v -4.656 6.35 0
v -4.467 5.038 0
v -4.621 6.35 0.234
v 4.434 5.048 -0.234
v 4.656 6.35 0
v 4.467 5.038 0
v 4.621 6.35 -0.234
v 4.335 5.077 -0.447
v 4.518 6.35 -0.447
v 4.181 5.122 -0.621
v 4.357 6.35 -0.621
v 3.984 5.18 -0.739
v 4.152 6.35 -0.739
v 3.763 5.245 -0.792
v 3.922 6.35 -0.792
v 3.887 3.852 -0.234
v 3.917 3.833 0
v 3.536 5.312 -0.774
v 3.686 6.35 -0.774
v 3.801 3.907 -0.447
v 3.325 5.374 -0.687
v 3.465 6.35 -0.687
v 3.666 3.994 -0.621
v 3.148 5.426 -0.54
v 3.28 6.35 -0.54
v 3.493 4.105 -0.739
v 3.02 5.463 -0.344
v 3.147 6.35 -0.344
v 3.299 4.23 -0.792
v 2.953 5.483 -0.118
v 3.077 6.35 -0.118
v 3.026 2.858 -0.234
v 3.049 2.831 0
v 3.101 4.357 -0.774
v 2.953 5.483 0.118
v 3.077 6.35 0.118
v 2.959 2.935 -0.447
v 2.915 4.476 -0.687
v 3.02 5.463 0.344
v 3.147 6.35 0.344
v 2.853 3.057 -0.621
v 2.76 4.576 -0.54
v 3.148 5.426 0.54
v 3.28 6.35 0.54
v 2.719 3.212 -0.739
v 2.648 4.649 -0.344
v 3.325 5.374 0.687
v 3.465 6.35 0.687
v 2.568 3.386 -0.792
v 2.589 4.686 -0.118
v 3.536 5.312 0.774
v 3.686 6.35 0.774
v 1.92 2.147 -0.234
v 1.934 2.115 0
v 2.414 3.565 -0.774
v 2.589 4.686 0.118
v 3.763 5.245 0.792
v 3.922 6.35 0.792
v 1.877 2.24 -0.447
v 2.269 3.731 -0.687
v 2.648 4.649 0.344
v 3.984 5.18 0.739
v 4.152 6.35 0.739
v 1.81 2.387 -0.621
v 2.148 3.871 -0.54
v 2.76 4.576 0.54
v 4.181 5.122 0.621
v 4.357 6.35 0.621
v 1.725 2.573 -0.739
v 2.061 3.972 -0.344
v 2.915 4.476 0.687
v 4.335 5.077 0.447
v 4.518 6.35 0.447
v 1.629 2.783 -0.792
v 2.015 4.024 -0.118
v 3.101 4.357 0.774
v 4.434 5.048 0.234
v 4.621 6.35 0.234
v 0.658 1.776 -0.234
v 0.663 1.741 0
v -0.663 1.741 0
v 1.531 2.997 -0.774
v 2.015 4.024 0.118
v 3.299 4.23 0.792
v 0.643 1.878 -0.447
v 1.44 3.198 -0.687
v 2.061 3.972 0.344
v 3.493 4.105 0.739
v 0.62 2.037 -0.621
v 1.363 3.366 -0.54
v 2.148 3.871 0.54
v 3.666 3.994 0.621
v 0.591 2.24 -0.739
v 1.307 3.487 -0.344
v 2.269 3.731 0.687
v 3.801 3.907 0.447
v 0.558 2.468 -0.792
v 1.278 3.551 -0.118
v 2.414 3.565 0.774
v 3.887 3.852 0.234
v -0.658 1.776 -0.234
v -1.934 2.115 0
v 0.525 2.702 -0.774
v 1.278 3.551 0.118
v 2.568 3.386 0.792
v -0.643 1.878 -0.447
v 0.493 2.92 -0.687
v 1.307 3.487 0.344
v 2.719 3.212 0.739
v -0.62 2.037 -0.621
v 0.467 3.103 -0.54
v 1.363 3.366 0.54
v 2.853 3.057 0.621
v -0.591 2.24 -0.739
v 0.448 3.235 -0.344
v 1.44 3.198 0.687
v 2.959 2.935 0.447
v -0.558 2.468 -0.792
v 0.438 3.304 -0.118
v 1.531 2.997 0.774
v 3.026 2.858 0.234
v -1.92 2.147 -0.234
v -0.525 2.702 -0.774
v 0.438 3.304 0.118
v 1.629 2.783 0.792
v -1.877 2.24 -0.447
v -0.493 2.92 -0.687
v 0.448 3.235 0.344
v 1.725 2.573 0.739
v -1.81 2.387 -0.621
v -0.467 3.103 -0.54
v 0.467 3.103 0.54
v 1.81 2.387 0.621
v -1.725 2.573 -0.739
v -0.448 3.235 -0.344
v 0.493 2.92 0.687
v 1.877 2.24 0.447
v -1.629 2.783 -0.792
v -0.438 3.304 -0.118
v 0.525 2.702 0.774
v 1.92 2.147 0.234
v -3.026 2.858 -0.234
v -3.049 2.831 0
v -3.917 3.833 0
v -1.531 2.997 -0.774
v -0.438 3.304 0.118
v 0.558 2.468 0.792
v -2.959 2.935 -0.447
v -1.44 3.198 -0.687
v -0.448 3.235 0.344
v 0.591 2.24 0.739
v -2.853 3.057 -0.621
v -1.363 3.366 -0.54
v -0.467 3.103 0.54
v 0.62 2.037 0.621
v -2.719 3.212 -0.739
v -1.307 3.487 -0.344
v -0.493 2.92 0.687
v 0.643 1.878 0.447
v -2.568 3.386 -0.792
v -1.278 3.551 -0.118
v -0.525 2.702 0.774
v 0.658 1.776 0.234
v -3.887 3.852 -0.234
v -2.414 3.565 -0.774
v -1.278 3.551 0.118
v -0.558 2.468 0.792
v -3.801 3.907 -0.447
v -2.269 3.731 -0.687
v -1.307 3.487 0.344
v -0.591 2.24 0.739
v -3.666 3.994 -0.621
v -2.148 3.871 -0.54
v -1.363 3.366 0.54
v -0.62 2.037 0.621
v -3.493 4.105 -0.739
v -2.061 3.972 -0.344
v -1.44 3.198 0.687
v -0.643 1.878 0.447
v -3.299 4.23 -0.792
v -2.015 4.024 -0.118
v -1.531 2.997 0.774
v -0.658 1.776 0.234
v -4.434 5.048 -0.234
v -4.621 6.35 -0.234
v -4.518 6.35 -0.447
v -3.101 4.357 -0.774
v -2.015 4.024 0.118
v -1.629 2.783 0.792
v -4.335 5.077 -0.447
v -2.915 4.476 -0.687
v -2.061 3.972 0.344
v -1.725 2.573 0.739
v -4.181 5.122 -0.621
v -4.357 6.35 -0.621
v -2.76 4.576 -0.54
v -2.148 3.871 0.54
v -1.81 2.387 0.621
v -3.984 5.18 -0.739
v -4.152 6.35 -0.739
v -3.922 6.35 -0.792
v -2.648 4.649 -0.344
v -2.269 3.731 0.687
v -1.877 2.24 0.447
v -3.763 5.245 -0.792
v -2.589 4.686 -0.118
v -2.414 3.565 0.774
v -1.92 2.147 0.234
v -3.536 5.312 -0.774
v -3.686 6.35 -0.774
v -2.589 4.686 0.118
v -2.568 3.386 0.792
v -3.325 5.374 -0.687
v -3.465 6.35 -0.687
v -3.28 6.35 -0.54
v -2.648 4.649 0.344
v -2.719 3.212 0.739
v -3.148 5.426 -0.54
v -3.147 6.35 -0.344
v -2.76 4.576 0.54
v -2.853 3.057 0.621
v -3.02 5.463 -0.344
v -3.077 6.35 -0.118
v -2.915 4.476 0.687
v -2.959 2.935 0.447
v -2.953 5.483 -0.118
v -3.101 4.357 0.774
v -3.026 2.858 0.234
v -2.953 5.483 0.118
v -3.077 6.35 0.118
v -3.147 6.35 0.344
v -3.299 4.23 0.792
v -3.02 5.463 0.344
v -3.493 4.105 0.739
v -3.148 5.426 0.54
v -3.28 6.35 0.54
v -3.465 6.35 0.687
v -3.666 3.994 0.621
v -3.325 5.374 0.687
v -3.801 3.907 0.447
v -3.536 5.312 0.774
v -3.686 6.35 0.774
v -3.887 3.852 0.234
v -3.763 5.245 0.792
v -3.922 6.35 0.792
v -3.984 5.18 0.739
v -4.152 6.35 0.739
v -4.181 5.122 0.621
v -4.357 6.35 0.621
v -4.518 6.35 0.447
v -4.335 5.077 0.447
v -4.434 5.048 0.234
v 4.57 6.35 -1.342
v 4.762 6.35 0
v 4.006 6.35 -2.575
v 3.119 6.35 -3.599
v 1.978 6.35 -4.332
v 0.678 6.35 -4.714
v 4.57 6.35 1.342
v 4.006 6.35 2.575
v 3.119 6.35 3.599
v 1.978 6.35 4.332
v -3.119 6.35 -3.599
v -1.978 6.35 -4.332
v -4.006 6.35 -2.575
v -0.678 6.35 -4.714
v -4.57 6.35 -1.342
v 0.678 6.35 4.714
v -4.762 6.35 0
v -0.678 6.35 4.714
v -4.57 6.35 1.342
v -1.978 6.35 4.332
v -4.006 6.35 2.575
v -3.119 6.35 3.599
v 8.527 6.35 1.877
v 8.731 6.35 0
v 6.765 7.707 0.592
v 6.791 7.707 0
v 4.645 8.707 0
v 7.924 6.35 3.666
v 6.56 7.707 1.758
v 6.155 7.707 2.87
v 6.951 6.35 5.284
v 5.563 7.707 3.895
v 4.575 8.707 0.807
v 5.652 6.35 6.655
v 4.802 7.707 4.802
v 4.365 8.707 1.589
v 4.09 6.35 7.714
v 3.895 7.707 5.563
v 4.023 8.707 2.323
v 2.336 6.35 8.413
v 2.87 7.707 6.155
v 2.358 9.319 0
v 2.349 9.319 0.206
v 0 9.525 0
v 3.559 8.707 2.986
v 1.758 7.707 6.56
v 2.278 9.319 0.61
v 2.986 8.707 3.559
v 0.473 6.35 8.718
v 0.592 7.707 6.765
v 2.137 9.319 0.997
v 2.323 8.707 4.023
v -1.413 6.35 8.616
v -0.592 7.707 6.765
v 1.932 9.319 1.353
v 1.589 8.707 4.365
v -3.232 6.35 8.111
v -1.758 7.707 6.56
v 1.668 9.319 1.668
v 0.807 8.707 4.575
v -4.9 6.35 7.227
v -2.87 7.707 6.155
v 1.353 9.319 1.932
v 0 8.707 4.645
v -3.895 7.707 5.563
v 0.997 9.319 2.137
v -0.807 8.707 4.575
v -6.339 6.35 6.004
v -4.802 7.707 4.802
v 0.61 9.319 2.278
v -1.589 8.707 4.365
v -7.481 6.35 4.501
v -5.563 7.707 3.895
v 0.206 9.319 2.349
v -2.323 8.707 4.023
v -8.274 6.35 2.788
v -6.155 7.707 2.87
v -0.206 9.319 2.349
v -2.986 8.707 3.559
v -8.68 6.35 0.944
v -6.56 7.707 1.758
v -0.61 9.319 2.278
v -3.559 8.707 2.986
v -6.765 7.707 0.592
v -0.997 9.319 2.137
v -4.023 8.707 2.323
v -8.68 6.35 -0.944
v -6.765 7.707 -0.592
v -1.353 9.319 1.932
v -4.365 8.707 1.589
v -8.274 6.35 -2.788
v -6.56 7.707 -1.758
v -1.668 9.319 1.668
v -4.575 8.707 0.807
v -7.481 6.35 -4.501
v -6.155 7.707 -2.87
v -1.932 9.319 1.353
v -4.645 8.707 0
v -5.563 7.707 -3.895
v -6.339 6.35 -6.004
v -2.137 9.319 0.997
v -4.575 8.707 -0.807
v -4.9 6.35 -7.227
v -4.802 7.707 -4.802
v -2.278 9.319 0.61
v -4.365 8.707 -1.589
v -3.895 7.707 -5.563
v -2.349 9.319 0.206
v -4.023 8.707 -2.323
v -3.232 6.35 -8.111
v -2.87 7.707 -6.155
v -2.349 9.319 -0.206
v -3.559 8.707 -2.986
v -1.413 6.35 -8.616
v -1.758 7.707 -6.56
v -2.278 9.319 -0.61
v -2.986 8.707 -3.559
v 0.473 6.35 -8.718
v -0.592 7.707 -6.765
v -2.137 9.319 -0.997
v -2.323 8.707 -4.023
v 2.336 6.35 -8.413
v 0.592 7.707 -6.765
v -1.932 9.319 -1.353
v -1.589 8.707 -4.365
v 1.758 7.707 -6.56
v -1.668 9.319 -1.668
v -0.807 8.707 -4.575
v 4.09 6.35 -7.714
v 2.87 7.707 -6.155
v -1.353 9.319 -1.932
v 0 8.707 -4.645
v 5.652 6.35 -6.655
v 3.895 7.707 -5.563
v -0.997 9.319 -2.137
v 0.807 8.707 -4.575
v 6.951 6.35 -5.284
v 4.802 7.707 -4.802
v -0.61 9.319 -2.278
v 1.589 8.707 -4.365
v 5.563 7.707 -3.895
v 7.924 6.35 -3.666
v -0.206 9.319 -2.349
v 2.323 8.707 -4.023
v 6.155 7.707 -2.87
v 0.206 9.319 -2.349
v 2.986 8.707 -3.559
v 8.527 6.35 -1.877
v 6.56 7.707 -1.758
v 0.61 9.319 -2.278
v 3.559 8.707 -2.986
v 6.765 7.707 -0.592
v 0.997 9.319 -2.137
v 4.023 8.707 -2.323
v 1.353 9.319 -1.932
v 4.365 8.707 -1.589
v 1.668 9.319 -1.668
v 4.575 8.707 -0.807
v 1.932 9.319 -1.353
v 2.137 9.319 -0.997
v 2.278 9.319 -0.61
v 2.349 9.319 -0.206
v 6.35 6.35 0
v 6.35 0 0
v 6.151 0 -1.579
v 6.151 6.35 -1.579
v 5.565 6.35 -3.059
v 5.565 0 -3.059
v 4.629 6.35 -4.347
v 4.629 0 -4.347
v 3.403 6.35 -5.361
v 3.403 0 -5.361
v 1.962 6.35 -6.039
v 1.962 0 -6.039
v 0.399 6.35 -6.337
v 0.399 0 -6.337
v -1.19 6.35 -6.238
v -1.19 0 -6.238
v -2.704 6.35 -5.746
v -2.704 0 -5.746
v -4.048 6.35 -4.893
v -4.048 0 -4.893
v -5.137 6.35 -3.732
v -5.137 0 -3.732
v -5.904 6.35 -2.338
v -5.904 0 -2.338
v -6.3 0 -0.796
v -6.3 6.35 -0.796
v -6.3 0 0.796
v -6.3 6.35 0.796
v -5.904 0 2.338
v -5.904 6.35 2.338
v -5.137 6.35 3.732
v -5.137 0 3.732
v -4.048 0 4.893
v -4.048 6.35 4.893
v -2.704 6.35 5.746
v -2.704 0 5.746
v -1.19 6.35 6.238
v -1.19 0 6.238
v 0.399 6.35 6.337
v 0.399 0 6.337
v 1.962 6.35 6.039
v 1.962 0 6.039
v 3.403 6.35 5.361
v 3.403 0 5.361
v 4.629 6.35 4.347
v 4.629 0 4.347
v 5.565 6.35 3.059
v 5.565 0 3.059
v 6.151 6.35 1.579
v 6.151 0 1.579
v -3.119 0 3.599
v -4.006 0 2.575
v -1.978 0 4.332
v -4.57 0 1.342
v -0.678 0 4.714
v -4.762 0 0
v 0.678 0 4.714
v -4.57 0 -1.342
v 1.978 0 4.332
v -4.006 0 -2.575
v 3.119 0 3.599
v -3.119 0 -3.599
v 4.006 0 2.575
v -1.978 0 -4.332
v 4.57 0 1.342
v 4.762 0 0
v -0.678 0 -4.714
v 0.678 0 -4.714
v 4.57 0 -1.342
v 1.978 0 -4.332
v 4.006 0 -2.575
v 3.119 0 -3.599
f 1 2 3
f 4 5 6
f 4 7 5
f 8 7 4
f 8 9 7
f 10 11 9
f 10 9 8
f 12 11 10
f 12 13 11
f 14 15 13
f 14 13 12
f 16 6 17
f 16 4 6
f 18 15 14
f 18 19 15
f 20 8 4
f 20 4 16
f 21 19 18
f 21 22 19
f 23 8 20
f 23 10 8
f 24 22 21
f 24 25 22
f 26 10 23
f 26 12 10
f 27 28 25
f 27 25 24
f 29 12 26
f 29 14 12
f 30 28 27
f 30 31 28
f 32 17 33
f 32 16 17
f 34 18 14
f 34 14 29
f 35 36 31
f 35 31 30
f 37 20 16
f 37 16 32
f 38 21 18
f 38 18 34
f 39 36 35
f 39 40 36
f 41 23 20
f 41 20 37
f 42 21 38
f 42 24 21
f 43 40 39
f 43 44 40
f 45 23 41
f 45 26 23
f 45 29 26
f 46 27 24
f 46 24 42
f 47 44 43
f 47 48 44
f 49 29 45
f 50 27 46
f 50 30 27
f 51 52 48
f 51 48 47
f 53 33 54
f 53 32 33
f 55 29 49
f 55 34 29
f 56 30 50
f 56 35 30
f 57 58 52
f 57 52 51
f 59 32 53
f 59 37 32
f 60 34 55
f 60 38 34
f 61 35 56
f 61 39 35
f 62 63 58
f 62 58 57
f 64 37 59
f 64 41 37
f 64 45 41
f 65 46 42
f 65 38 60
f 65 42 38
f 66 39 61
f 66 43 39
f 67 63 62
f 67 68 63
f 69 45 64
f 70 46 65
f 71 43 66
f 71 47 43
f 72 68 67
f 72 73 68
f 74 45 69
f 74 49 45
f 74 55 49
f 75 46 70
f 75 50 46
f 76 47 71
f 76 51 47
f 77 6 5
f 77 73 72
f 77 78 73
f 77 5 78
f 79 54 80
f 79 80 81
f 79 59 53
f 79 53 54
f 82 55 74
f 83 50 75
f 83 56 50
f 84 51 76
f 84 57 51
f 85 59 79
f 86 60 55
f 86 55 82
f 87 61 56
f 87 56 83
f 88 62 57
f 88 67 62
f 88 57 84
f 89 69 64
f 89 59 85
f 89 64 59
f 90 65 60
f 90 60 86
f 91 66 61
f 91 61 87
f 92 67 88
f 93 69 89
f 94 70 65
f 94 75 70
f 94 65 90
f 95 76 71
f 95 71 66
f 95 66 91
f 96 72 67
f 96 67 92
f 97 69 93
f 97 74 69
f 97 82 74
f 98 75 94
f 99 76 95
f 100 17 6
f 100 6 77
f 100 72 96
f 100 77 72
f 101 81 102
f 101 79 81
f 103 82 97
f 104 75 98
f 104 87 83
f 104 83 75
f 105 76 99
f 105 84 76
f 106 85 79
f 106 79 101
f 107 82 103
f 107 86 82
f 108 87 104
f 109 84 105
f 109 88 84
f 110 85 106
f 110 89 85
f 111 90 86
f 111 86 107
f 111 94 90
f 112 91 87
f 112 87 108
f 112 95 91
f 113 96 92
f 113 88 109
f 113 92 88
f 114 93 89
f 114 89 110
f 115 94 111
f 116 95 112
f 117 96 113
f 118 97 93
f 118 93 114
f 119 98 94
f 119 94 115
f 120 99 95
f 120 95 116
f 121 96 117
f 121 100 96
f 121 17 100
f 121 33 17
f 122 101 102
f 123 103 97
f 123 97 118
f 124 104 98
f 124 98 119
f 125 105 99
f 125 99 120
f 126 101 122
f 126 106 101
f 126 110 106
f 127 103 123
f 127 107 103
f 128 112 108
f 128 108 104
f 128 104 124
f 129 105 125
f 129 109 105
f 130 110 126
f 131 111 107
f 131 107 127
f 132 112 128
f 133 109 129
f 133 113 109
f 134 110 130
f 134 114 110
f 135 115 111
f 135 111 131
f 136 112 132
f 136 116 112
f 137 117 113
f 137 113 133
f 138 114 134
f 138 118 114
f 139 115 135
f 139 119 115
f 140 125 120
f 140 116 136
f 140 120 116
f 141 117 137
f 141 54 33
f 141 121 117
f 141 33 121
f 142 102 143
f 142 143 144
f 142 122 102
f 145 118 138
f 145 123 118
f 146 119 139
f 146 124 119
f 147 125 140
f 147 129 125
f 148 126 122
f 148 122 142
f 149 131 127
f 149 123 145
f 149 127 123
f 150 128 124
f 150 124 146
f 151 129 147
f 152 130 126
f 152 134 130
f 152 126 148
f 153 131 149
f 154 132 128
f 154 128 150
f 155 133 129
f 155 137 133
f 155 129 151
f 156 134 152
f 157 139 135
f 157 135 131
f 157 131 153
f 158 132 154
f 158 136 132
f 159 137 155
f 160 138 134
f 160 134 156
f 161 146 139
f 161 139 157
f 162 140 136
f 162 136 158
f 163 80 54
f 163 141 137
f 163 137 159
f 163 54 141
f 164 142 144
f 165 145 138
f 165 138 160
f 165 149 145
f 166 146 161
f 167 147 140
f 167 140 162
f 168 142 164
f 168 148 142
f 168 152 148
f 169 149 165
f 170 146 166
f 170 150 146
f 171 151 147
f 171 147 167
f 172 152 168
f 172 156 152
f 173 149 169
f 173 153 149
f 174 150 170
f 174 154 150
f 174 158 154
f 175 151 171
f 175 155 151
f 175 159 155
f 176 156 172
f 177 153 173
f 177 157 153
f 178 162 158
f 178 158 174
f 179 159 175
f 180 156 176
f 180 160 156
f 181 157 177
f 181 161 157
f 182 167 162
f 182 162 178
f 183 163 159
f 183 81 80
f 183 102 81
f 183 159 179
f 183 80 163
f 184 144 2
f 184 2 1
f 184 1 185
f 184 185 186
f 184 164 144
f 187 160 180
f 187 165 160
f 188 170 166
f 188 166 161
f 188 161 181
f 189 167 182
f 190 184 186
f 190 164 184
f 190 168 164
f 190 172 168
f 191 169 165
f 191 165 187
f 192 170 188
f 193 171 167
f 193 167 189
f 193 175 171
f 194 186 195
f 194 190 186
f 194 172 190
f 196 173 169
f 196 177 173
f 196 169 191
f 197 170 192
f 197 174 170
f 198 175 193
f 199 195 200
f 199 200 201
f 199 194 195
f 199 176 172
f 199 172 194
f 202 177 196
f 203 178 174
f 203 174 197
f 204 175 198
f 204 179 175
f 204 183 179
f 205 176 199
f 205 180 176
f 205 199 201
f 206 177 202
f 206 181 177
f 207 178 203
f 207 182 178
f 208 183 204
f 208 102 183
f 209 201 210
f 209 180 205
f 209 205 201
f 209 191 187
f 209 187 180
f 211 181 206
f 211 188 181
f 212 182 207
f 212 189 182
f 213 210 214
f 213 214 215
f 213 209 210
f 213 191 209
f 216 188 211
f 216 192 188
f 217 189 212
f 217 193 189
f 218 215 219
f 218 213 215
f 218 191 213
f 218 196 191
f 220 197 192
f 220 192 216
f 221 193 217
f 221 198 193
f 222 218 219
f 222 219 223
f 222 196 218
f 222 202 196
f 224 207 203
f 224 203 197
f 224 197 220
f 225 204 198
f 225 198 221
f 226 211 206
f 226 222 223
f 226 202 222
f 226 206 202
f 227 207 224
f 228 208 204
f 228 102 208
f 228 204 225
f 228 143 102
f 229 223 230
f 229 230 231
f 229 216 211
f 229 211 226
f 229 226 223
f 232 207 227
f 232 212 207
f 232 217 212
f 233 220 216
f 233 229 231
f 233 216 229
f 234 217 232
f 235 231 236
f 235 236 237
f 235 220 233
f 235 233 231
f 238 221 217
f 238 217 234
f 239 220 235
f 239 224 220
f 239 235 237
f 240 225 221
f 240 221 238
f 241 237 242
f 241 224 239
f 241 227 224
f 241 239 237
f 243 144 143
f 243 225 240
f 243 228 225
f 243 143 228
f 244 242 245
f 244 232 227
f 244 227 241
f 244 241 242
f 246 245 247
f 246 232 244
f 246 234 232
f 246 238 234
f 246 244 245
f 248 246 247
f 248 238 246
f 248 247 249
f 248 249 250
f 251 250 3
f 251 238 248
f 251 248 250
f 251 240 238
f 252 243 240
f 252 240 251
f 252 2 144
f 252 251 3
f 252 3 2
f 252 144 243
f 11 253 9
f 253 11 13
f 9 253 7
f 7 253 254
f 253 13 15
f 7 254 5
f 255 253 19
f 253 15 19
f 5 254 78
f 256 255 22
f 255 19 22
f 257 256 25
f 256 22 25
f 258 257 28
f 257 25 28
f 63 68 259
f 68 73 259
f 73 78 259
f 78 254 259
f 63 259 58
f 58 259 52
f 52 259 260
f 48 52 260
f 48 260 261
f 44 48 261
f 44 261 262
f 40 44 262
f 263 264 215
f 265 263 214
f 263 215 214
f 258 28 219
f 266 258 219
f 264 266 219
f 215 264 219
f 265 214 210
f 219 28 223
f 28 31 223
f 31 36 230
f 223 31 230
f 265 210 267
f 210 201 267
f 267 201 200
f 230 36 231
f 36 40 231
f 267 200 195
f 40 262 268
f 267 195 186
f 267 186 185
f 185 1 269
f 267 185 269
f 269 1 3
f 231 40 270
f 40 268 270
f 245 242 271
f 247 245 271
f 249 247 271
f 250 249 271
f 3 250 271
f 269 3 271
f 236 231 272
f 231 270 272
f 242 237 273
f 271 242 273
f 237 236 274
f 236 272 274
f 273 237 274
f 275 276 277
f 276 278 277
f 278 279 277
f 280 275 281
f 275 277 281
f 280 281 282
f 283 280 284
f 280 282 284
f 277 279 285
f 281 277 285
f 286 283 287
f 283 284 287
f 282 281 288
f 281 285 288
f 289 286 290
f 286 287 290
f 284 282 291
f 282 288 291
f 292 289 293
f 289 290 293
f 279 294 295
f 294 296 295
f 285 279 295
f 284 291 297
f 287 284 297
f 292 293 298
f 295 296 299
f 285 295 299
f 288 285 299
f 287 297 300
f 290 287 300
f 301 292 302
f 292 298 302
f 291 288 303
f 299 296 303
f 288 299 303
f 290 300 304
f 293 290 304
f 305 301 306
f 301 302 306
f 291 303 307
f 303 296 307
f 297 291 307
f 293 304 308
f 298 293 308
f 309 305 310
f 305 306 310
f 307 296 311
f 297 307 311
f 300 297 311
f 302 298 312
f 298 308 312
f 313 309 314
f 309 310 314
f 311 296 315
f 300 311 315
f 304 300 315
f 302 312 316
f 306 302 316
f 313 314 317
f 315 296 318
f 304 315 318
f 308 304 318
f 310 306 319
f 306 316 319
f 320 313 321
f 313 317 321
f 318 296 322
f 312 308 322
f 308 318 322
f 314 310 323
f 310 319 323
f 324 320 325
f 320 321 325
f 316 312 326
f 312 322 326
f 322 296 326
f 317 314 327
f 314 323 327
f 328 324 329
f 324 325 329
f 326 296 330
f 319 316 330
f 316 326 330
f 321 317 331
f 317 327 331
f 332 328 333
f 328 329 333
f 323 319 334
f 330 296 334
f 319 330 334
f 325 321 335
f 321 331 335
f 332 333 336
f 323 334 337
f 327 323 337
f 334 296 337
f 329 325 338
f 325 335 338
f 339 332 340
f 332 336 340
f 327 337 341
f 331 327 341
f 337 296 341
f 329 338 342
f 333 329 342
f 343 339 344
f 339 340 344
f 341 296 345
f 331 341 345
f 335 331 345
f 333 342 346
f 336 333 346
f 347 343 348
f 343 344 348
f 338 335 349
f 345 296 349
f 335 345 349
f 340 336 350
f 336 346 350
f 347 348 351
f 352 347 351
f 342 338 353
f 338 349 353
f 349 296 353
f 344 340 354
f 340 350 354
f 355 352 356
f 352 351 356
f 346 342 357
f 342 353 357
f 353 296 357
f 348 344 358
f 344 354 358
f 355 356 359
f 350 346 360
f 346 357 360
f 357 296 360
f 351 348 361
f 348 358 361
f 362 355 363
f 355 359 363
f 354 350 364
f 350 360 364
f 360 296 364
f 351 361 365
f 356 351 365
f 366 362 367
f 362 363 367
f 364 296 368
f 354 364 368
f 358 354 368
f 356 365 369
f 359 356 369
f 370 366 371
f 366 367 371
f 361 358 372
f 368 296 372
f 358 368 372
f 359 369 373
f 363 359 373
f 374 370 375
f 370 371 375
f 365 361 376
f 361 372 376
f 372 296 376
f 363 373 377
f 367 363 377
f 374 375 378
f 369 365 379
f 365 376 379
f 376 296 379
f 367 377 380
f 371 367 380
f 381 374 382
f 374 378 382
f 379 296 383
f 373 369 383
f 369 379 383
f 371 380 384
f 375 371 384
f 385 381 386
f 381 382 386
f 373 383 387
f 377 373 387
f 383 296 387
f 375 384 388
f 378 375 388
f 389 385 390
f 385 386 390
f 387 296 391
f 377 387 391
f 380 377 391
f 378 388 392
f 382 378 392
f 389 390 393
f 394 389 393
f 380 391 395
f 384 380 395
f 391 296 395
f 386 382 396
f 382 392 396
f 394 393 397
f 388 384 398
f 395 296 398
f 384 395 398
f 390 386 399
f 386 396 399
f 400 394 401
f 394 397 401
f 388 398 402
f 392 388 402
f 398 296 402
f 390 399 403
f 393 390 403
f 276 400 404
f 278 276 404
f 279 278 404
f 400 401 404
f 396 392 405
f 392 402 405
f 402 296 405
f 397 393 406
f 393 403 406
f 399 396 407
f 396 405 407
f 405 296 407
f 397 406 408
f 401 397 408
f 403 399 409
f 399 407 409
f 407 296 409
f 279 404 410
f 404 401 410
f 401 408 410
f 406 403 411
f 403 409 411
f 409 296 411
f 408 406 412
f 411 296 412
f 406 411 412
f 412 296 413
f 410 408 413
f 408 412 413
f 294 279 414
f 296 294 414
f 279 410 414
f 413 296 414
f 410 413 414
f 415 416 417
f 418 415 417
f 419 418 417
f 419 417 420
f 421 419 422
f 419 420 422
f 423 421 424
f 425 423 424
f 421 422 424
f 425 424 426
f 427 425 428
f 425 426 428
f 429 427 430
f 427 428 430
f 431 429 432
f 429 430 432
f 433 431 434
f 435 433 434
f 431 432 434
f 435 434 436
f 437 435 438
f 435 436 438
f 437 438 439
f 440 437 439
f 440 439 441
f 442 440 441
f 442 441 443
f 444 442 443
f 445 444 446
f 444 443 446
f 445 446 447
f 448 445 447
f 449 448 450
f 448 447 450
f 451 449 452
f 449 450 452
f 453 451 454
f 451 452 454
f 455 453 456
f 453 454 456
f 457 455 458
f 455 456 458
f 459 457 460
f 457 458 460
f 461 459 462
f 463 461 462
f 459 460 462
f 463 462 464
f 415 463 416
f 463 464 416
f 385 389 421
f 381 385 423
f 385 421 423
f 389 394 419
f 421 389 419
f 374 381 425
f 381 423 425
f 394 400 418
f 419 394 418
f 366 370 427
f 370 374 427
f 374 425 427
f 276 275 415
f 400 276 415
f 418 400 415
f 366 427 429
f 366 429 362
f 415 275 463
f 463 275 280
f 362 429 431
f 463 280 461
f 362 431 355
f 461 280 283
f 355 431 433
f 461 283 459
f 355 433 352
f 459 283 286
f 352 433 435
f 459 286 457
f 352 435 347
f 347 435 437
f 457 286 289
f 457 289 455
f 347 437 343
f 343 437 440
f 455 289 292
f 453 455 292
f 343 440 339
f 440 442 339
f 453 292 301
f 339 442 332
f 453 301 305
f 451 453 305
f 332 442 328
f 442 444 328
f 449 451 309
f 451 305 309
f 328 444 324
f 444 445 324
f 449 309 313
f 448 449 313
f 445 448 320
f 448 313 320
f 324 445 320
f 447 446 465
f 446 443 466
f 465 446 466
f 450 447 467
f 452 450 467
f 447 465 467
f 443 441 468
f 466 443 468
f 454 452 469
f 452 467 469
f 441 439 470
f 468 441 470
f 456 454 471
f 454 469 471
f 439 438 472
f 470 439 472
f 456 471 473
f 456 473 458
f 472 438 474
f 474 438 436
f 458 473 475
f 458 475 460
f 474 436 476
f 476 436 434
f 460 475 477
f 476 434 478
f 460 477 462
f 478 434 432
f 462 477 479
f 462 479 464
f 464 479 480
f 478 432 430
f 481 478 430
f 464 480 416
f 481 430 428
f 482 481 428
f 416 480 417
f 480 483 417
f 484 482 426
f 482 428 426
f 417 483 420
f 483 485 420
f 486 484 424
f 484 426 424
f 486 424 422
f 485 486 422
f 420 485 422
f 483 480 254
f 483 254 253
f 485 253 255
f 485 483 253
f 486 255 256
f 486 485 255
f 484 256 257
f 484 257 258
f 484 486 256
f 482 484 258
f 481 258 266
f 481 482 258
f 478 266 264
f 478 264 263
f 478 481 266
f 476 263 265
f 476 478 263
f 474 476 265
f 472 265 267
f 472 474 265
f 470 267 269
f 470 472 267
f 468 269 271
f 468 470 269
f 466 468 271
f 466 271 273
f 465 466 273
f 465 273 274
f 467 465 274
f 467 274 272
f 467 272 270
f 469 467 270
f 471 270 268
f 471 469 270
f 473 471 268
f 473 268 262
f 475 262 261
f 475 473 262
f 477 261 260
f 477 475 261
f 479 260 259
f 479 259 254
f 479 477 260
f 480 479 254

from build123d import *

# Parameters (mm, degrees)
SKETCH1_R           = 6.35
SKETCH1_R_2         = 4.7625
BOSS_EXTRUDE1_DEPTH = 6.35
SKETCH4_R           = 0.79375


with BuildPart() as part:
    # Sketch1 → Boss-Extrude1 (new body)
    with BuildSketch(Plane(origin=(0, 0, 0), x_dir=(1, 0, 0), z_dir=(0, 1, 0))):
        Circle(SKETCH1_R)
        Circle(SKETCH1_R_2, mode=Mode.SUBTRACT)
    extrude(amount=BOSS_EXTRUDE1_DEPTH)

    # Sketch2 → Revolve1 (revolve)
    with BuildSketch(Plane.XY):
        with BuildLine():
            Line((0, 9.525), (0, 6.35))
            Line((0, 6.35), (8.73125, 6.35))
            ThreePointArc((8.73125, 6.35), (4.645302777, 8.706613887), (0, 9.525))
        make_face()
    revolve(axis=Axis((0, 9.525, 0), (0, -1, 0)))

    # Sweep1: sweep along a path in Sketch3
    with BuildLine(Plane.XY) as sweep1_path:
        ThreePointArc((3.862295552, 6.35), (0, 2.487704448), (-3.862295552, 6.35))
    # Sketch4 → Sweep1 (sweep)
    with BuildSketch(Plane.XZ.offset(-6.35)):
        with Locations((3.862295552, 0)):
            Circle(SKETCH4_R)
    sweep(path=sweep1_path.line)


solid = part.part
